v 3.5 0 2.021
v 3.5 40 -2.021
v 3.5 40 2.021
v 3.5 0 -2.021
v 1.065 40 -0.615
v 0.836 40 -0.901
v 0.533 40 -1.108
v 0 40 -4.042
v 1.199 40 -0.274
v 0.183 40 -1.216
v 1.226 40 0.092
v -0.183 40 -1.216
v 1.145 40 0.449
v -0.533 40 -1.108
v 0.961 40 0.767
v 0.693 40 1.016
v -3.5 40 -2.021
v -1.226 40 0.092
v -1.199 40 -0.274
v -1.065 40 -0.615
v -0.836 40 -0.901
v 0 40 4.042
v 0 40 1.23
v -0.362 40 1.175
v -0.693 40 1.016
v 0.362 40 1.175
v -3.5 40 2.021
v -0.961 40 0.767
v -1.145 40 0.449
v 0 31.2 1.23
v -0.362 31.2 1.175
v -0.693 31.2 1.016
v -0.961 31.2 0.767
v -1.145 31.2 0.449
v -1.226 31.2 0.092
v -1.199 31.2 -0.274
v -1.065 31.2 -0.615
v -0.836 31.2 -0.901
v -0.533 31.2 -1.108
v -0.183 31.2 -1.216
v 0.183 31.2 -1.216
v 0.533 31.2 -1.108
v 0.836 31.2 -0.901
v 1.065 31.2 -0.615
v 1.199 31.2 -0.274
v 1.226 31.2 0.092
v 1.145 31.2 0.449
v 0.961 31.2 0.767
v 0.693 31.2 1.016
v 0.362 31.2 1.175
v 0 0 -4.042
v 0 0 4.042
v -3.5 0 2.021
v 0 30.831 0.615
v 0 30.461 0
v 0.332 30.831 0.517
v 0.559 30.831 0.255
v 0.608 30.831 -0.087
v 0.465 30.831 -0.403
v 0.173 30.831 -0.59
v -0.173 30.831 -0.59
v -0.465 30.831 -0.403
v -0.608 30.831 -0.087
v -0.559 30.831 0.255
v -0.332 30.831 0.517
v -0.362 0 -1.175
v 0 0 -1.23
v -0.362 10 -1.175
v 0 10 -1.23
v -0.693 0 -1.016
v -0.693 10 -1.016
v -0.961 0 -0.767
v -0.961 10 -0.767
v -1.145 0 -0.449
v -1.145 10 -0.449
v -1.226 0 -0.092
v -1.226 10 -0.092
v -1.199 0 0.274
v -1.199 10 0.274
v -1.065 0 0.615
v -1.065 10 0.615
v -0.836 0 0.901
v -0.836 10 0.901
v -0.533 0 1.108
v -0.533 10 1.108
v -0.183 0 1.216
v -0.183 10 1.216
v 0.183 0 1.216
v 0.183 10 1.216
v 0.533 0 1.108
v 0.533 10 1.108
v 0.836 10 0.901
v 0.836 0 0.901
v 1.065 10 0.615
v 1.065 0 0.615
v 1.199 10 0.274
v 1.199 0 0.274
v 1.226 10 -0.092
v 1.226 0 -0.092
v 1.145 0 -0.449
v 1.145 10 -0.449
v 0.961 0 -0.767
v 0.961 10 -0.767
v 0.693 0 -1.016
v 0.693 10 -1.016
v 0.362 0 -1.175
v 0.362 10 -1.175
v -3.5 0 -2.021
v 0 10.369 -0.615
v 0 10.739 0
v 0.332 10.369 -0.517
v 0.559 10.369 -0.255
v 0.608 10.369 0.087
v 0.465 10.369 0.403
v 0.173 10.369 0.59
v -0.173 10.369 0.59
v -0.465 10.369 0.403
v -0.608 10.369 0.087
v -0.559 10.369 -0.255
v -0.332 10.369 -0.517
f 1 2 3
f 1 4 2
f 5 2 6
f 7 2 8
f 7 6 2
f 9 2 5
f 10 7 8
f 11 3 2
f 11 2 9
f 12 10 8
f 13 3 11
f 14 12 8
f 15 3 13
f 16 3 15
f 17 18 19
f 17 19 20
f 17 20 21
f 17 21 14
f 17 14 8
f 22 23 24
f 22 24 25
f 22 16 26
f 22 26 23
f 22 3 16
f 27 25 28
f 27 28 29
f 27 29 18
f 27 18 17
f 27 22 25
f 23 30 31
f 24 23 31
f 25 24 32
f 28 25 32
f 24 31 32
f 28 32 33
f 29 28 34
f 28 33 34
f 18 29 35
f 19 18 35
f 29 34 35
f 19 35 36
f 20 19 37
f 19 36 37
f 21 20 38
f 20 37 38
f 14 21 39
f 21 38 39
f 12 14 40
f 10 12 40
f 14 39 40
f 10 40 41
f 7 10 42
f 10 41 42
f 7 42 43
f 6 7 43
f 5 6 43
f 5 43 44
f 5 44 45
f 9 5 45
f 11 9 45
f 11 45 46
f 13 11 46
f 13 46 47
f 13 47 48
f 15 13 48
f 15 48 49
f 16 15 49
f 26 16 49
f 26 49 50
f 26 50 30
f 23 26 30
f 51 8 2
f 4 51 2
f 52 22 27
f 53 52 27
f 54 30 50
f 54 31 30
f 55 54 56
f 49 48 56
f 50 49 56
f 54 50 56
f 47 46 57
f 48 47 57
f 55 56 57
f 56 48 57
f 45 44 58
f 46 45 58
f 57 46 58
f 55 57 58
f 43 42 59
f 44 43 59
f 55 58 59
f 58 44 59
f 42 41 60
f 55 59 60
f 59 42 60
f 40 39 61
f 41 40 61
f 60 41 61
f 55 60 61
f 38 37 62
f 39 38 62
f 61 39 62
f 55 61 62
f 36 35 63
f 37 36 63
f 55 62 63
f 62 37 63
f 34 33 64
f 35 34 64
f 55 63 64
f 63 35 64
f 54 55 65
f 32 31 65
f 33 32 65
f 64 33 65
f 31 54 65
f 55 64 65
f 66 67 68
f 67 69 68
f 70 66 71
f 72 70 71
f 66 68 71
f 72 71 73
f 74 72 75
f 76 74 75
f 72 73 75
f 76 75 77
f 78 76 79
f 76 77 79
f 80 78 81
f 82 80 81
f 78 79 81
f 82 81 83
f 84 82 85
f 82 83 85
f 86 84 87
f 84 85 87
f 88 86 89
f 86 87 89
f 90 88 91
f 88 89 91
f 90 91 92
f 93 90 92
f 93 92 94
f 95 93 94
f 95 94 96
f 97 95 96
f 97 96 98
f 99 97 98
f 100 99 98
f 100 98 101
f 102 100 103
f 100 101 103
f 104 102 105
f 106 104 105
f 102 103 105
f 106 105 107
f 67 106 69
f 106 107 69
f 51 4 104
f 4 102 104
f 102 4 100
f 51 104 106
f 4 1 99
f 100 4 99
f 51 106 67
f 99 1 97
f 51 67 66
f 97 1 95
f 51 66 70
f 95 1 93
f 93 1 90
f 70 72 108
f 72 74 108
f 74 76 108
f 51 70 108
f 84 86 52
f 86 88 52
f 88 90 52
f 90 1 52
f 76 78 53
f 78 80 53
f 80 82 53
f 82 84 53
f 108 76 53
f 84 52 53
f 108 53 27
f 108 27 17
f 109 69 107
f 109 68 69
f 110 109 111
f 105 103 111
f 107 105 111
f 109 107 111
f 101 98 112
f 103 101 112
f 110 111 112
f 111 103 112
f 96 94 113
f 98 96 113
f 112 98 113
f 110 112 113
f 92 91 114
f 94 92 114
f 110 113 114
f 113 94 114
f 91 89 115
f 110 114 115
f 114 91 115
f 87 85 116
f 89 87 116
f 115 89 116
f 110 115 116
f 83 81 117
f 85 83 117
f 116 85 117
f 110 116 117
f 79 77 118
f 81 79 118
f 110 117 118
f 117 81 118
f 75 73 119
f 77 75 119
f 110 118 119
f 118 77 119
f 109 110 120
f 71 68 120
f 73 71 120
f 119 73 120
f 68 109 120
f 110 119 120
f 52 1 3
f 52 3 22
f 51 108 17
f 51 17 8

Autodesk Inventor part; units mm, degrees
ref_plane "YZ Plane" through (0, 0, 0) normal (1, 0, 0) x (0, 1, 0)
ref_plane "XZ Plane" through (0, 0, 0) normal (0, 1, 0) x (-1, 0, 0)
ref_plane "XY Plane" through (0, 0, 0) normal (0, 0, 1) x (1, 0, 0)
sketch "Szkic1" plane through (0, 0, 0) normal (0, 1, 0) x (-1, 0, 0)
  line L0 (-3.5, -2.0207) -> (-3.5, 2.0207)
  line L1 (-3.5, 2.0207) -> (0, 4.0415)
  line L2 (0, 4.0415) -> (3.5, 2.0207)
  line L3 (3.5, 2.0207) -> (3.5, -2.0207)
  line L4 (3.5, -2.0207) -> (0, -4.0415)
  line L5 (0, -4.0415) -> (-3.5, -2.0207)
  point P0 (0, 0)
  point P1 (0, 0)
  dimension "d0" = 7
extrude "Wyciągnięcie proste1" add sketch "Szkic1" along normal blind 40
sketch "Szkic2" plane through (0, 40, 0) normal (0, 1, 0) x (1, 0, 0)
  point P0 (0, 0)
  point P1 (0, 0)
hole "Otwór1" at (0, 40, 0) direction (0, -1, 0) diameter 2.459 depth 8.8 tip angle 118 thread size "M3x0.5" class "6H" standard "ISO Metric profile"
sketch "Szkic3" plane through (0, 0, 0) normal (0, -1, 0) x (1, 0, 0)
  circle A0 centre (0, 0) radius 1.2295 construction
hole "Otwór2" at (0, 0, 0) direction (0, 1, 0) diameter 2.459 depth 10 tip angle 118 thread size "M3x0.5" class "6H" standard "ISO Metric profile"
properties part number "CH_01_0021_distans_40mm"
